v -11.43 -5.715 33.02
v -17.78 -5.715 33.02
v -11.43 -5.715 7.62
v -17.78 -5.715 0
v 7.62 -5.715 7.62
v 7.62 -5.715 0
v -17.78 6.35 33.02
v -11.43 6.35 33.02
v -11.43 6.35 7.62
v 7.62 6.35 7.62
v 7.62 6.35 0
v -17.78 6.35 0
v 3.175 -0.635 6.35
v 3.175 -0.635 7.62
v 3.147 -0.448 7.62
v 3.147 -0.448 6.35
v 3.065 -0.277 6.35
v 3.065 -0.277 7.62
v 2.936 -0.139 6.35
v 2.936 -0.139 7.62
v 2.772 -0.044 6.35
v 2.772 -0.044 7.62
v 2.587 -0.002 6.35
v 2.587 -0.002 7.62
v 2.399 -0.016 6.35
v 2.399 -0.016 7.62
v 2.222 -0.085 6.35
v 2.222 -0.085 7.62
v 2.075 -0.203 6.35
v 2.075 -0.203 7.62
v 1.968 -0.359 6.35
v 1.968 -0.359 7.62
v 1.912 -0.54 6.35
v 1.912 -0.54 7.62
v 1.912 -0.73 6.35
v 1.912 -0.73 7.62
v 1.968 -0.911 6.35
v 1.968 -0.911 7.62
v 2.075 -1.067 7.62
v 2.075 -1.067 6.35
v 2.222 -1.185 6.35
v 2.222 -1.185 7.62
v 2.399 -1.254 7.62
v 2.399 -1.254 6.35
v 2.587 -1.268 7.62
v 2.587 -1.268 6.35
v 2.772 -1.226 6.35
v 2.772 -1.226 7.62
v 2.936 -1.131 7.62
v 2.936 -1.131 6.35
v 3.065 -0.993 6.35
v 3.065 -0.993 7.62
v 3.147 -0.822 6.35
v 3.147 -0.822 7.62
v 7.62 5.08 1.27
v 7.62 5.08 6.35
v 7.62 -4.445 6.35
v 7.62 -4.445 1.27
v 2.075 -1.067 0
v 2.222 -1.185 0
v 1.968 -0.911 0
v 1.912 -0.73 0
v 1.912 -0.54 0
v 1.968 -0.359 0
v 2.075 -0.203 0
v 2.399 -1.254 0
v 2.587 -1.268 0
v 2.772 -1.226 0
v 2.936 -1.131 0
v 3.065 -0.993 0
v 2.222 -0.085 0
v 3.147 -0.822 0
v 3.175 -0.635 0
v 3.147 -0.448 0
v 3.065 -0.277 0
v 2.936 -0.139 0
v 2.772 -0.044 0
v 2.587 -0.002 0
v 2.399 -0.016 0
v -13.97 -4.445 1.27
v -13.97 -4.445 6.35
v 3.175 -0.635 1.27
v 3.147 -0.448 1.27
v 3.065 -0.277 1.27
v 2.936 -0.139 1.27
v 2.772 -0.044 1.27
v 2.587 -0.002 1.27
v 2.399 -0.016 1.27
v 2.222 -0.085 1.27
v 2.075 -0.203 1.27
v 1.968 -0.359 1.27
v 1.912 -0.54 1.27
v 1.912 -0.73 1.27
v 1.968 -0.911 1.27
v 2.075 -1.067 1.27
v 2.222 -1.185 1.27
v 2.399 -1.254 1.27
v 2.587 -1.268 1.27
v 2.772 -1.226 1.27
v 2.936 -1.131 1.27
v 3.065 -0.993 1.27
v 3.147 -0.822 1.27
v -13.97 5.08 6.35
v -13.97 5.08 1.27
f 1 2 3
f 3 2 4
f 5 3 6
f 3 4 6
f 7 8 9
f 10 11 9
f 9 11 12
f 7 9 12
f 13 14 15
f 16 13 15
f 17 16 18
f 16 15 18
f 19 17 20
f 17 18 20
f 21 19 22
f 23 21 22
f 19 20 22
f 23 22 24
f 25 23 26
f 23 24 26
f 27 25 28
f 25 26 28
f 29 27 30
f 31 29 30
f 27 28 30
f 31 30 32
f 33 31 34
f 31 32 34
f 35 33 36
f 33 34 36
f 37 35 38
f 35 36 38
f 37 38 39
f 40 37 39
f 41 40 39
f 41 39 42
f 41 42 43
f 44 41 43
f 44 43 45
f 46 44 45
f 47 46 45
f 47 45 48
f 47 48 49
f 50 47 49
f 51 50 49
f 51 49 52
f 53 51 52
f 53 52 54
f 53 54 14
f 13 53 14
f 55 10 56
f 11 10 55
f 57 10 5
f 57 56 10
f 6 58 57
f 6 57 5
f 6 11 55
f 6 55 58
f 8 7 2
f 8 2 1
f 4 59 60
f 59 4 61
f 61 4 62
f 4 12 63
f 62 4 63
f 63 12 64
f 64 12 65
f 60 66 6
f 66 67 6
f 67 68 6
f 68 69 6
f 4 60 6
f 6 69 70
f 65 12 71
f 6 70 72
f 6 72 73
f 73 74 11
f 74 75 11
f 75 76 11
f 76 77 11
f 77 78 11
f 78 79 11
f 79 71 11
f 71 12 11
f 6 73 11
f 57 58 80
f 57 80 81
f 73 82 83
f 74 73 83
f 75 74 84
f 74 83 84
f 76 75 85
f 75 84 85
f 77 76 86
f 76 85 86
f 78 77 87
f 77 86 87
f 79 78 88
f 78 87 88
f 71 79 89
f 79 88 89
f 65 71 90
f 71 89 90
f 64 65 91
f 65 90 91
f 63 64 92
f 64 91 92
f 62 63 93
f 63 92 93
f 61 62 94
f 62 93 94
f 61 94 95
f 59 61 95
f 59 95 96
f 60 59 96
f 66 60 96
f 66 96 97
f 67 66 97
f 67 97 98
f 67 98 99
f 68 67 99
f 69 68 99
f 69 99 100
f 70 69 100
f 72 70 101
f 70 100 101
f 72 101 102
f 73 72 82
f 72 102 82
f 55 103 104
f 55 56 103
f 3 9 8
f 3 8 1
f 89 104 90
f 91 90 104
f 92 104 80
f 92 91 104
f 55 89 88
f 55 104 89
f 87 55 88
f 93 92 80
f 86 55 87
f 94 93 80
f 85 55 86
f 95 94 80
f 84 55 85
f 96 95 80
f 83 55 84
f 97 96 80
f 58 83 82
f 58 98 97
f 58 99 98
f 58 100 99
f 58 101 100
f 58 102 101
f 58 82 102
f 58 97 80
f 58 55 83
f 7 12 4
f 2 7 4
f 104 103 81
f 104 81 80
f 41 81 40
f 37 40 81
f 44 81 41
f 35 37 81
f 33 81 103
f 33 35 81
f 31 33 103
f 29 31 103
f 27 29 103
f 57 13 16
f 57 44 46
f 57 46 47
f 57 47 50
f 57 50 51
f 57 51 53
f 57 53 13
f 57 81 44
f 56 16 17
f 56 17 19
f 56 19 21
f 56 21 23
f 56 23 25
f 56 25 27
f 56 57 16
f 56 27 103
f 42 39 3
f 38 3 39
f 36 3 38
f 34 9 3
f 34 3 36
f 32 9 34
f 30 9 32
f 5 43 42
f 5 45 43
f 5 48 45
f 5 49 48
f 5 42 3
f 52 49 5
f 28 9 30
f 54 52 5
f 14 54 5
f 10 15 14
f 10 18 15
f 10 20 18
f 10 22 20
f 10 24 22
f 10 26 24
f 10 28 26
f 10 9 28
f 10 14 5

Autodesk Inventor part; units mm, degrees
ref_plane "YZ Plane" through (0, 0, 0) normal (1, 0, 0) x (0, 1, 0)
ref_plane "XZ Plane" through (0, 0, 0) normal (0, 1, 0) x (-1, 0, 0)
ref_plane "XY Plane" through (0, 0, 0) normal (0, 0, 1) x (1, 0, 0)
sketch "Sketch1" plane through (0, 0, 0) normal (0, 0, 1) x (1, 0, 0)
  line L0 (-17.78, 6.35) -> (7.62, 6.35)
  line L1 (7.62, 6.35) -> (7.62, -5.715)
  line L2 (7.62, -5.715) -> (-17.78, -5.715)
  line L3 (-17.78, -5.715) -> (-17.78, 6.35)
  point P0 (0, 0)
  dimension "d0" = 25.4
  dimension "d1" = 12.065
  dimension "d2" = 7.62
  dimension "d3" = 6.35
extrude "Extrusion1" add sketch "Sketch1" along normal blind 7.62
sketch "Sketch2" plane through (7.62, -5.715, 0) normal (1, 0, 0) x (0, 0, -1)
  line L0 (-6.35, 10.795) -> (-1.27, 10.795)
  line L1 (-1.27, 10.795) -> (-1.27, 1.27)
  line L2 (-1.27, 1.27) -> (-6.35, 1.27)
  line L3 (-6.35, 1.27) -> (-6.35, 10.795)
  line L4 (-7.62, 0) -> (-7.62, 12.065) projected
  line L5 (0, 12.065) -> (-7.62, 12.065) projected
  line L6 (0, 12.065) -> (0, 0) projected
  line L7 (0, 0) -> (-7.62, 0) projected
  point P0 (0, 5.715)
  dimension "d8" = 1.27
  dimension "d9" = 1.27
  dimension "d23" = 1.27
  dimension "d24" = 1.27
extrude "Extrusion2" cut sketch "Sketch2" against normal blind 21.59 contours L0 L1 L2 L3
sketch "Sketch3" plane through (0, 0, 7.62) normal (0, 0, 1) x (1, 0, 0)
  line L0 (-17.78, 6.35) -> (-17.78, -5.715) projected
  line L1 (7.62, 6.35) -> (-17.78, 6.35) projected
  line L2 (-17.78, -5.715) -> (7.62, -5.715) projected
  line L3 (-17.78, 6.35) -> (-11.43, 6.35)
  line L4 (-11.43, 6.35) -> (-11.43, -5.715)
  line L5 (-11.43, -5.715) -> (-17.78, -5.715)
  line L6 (-17.78, -5.715) -> (-17.78, 6.35)
  point P0 (0, 0)
  dimension "d26" = 6.35
extrude "Extrusion3" add sketch "Sketch3" along normal blind 25.4
sketch "Sketch4" plane through (0, 0, 7.62) normal (0, 0, 1) x (1, 0, 0)
  circle A0 centre (2.54, -0.635) radius 0.635
  line L0 (7.62, 6.35) -> (-17.78, 6.35) projected
  point P0 (0, 0)
  point P1 (-11.43, 6.35)
  dimension "d18" = 1.27
  dimension "d20" = 6.985
  dimension "d25" = 2.54
extrude "Extrusion4" cut sketch "Sketch4" against normal blind 50.8
properties part number "hollowPart"
